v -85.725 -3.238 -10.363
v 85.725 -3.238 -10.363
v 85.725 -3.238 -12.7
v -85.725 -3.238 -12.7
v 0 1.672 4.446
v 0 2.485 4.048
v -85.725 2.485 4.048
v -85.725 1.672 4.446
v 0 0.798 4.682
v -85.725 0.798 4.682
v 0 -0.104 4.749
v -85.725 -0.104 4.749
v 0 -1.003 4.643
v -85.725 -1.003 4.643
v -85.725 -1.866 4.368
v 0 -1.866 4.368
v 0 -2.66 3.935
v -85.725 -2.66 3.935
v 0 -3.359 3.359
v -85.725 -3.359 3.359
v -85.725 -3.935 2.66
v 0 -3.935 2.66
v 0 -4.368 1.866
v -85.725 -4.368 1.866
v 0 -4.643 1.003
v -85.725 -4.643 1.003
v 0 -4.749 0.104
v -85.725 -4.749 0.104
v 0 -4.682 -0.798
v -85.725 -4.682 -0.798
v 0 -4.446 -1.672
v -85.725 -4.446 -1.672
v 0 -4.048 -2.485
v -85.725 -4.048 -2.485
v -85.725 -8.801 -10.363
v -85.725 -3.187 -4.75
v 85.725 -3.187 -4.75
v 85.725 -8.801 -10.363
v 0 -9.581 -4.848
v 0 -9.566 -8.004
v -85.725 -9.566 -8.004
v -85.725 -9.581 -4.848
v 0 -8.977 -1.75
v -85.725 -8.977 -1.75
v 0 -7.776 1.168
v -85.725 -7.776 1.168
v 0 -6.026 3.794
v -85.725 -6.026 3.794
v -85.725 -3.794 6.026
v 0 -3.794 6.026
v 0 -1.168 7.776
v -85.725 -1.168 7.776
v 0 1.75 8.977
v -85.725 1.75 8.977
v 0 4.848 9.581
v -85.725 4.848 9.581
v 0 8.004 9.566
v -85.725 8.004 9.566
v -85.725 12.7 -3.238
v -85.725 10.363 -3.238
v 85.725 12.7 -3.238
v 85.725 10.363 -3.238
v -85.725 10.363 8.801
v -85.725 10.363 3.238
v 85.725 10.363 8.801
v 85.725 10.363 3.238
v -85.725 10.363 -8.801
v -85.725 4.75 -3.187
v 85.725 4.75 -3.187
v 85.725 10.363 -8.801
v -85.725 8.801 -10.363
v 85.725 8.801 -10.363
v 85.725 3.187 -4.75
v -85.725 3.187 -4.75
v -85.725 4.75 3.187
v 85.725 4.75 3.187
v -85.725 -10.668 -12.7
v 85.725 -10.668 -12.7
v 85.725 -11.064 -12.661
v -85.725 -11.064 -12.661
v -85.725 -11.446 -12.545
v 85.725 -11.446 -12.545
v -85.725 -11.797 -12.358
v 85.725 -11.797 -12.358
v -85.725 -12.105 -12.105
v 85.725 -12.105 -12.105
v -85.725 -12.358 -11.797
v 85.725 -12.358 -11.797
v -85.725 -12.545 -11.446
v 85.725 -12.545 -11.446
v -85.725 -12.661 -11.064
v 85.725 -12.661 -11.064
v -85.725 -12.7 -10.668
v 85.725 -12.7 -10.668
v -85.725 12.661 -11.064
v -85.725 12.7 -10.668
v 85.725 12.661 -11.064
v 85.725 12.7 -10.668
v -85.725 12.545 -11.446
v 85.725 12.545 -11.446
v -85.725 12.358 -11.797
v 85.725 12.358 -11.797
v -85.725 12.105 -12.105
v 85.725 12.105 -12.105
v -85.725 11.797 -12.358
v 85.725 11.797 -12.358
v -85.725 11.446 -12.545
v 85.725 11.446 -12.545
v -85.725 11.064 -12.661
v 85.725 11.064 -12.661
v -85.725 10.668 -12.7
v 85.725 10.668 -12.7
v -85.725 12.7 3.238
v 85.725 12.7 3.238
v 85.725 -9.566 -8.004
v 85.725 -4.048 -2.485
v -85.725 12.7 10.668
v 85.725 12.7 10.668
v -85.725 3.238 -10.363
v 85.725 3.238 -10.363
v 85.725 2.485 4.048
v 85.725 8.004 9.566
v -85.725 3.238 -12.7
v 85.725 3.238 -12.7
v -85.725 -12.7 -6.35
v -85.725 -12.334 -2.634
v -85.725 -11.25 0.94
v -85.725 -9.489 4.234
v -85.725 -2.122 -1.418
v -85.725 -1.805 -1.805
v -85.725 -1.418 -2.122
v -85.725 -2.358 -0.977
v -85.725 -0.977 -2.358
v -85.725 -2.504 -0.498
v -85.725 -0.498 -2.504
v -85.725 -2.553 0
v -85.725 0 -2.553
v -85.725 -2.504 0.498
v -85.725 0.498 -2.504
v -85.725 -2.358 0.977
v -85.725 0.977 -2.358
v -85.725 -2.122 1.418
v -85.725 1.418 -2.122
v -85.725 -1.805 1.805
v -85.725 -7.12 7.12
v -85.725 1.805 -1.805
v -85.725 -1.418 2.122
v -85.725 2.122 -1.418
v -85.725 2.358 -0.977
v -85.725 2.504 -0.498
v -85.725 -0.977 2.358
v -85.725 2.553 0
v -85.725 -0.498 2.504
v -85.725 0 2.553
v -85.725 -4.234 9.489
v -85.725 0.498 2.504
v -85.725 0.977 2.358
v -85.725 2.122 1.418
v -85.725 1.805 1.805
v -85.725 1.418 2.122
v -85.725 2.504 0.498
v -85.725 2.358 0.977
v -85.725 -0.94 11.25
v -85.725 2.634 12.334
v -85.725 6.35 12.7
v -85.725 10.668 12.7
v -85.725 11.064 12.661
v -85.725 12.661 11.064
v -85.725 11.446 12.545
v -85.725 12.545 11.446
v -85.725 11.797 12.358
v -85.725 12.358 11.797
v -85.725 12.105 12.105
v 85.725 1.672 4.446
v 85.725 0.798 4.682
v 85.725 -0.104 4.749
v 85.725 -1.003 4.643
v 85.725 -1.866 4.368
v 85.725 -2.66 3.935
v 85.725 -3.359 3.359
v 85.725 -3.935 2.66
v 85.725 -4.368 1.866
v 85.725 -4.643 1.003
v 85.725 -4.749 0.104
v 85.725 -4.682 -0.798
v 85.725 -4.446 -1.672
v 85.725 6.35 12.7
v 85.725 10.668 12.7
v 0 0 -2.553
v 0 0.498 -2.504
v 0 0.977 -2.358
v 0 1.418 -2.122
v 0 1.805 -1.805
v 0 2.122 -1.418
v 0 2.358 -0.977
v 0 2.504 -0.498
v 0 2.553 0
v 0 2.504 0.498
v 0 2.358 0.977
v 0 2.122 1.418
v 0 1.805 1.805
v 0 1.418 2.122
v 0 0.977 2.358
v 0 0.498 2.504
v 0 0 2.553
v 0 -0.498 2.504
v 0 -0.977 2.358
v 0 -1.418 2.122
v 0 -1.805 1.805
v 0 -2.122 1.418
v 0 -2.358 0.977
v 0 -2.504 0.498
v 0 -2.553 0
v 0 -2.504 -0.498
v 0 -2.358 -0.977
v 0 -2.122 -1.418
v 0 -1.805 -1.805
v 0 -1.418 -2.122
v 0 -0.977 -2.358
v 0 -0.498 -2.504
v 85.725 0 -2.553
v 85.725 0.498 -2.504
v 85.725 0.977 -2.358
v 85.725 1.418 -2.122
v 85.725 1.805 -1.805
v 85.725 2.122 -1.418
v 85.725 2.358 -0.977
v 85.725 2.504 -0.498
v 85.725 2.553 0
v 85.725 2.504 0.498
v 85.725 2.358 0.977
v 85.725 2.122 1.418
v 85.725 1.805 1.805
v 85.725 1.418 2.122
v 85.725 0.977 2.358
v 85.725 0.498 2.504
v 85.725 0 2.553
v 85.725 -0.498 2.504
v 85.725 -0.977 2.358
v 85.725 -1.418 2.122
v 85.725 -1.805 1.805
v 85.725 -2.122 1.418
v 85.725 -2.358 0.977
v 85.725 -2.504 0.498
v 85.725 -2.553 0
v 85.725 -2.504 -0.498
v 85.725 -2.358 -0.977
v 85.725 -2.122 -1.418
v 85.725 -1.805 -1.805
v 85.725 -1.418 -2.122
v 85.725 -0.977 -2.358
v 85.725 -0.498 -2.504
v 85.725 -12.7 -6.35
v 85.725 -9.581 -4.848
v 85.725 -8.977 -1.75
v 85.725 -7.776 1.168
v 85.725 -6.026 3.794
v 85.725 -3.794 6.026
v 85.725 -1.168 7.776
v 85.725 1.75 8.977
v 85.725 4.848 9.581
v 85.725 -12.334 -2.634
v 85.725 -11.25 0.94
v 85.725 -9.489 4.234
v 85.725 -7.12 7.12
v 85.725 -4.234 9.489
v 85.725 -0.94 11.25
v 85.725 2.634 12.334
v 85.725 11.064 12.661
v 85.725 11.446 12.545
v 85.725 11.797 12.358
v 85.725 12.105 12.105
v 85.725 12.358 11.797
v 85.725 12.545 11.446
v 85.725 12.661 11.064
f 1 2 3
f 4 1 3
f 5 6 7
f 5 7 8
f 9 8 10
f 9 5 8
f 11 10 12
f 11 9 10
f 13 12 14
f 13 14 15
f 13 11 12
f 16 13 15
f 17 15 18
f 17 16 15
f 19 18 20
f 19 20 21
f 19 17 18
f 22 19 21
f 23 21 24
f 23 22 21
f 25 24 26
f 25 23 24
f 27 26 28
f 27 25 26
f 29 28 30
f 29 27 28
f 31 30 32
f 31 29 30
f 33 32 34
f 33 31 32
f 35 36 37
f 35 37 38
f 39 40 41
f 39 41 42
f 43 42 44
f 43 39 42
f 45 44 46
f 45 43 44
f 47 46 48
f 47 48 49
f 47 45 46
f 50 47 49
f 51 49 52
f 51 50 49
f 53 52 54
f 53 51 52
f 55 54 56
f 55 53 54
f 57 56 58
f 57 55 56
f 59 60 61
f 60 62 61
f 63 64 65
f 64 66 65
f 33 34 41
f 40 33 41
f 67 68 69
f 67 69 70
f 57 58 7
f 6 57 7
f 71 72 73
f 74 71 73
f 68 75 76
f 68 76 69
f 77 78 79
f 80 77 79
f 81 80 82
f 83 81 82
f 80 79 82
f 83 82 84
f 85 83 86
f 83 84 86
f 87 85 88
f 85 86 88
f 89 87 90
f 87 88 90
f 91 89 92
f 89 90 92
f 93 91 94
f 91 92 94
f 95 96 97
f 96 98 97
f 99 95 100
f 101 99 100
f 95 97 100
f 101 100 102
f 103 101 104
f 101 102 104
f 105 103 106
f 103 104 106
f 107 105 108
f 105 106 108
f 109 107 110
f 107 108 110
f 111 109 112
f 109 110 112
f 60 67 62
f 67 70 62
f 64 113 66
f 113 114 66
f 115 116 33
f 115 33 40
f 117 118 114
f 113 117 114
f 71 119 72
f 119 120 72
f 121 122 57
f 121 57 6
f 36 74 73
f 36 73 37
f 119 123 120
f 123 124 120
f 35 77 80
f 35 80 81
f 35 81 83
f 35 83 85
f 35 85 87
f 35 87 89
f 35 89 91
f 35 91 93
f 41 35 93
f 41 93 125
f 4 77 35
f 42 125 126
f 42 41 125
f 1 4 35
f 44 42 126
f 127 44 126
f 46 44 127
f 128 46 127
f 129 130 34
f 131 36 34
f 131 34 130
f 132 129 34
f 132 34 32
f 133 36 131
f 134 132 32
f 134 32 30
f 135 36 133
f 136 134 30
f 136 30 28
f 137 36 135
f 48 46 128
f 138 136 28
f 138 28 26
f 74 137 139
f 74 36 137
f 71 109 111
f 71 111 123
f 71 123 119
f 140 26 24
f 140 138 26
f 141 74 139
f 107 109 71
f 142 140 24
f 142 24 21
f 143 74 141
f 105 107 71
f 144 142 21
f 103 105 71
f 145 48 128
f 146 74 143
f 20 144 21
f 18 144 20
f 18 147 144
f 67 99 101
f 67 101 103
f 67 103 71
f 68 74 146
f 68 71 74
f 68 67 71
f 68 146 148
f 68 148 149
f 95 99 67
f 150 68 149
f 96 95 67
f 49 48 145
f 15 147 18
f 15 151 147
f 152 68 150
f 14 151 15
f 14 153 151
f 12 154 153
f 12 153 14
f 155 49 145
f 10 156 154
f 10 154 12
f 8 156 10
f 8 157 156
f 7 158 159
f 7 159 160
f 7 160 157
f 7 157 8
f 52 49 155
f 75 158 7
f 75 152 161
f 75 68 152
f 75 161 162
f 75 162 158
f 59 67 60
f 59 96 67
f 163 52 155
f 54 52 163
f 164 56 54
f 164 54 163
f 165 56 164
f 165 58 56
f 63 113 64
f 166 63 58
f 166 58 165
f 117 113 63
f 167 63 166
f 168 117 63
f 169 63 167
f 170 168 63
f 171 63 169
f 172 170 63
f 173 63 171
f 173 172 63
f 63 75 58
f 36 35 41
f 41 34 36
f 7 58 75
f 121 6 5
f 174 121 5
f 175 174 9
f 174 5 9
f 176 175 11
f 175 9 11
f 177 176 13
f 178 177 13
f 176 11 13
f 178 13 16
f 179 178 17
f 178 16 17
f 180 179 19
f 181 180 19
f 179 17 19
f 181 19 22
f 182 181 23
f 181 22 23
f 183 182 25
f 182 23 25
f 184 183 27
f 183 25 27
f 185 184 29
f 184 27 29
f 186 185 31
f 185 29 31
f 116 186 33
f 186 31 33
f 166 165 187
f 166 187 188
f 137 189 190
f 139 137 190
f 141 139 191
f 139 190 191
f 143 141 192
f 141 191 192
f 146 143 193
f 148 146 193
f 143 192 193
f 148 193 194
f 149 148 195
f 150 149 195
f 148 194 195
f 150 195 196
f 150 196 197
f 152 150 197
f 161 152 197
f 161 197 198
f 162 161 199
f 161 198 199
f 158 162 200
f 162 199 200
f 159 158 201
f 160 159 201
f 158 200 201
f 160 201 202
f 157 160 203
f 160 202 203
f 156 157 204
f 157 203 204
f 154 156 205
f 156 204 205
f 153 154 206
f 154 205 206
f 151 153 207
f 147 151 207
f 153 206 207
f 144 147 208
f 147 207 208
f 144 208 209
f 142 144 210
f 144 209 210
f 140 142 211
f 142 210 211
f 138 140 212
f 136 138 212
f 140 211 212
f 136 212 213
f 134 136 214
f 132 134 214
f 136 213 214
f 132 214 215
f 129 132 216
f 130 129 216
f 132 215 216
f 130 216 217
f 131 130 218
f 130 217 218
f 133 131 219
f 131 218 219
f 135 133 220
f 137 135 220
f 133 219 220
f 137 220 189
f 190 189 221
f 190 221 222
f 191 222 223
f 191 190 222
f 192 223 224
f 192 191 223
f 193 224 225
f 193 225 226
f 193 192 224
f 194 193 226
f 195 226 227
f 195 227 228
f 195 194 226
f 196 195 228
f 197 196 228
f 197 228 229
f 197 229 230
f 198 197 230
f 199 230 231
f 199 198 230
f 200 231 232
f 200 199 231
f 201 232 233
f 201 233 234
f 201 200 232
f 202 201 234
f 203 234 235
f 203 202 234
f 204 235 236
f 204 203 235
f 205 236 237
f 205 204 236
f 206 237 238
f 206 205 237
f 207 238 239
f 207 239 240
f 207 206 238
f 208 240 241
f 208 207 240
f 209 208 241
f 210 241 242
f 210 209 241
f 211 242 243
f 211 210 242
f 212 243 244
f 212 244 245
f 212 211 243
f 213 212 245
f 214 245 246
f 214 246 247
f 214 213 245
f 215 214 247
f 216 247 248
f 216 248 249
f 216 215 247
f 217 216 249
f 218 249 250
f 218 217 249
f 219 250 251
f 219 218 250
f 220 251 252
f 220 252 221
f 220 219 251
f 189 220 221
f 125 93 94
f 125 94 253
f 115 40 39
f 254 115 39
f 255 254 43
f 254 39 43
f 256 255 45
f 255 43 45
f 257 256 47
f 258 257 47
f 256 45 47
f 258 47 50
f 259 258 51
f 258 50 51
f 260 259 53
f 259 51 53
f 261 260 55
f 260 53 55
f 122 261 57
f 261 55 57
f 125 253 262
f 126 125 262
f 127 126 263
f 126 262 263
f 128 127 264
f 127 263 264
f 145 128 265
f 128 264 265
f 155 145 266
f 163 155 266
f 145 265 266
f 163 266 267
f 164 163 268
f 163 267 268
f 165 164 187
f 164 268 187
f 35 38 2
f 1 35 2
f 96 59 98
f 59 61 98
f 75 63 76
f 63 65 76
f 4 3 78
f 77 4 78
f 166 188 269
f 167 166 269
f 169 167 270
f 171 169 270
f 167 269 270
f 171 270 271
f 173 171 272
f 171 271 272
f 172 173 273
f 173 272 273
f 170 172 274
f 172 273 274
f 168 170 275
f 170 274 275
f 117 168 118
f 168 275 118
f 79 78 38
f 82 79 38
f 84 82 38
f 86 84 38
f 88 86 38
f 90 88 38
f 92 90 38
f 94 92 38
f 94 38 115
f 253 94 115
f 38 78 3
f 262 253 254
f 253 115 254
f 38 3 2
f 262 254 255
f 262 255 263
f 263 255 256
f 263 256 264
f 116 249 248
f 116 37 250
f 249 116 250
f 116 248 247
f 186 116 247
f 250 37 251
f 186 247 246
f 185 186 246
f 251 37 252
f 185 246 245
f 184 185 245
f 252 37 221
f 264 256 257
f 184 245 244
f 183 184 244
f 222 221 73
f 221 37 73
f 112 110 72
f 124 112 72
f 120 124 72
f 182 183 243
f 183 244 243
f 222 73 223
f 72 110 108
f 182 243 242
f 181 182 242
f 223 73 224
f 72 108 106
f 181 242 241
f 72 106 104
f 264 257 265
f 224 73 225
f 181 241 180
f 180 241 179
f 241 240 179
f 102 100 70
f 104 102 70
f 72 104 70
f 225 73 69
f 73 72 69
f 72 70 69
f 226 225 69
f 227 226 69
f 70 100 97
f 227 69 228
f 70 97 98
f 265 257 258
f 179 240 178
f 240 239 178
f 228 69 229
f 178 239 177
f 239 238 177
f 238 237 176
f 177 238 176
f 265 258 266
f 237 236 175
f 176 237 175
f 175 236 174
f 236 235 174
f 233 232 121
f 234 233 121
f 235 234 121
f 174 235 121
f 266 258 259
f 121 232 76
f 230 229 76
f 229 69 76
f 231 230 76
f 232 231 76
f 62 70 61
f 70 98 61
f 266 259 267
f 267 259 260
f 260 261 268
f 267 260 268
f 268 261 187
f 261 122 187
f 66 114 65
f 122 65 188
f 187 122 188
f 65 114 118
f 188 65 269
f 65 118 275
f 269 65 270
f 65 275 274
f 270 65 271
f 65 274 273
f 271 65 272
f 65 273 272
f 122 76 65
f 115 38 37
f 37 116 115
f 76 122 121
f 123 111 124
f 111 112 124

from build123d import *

# Parameters (mm, degrees)
SKETCH3_R                = 2.5527
BOSS_EXTRUDE1_DEPTH      = 85.725
BOSS_EXTRUDE1_DEPTH_BACK = 85.725


with BuildPart() as part:
    # Sketch3 → Boss-Extrude1 (new body, two sides)
    with BuildSketch(Plane(origin=(0, 0, 0), x_dir=(0, 0, -1), z_dir=(1, 0, 0))) as boss_extrude1_sk:
        with BuildLine():
            Line((-10.668, 12.7), (-3.2385, 12.7))
            Line((-3.2385, 12.7), (-3.2385, 10.3632))
            Line((-3.2385, 10.3632), (-8.800635435, 10.3632))
            Line((-8.800635435, 10.3632), (-3.187235669, 4.749800235))
            Line((-3.187235669, 4.749800235), (3.187235669, 4.749800235))
            Line((3.187235669, 4.749800235), (8.800635435, 10.3632))
            Line((8.800635435, 10.3632), (3.2385, 10.3632))
            Line((3.2385, 10.3632), (3.2385, 12.7))
            Line((3.2385, 12.7), (10.668, 12.7))
            ThreePointArc((10.668, 12.7), (12.104840979, 12.104840979), (12.7, 10.668))
            Line((12.7, 10.668), (12.7, 3.2385))
            Line((12.7, 3.2385), (10.3632, 3.2385))
            Line((10.3632, 3.2385), (10.3632, 8.800635435))
            Line((10.3632, 8.800635435), (4.749800235, 3.187235669))
            Line((4.749800235, 3.187235669), (4.749800235, -3.187235669))
            Line((4.749800235, -3.187235669), (10.3632, -8.800635435))
            Line((10.3632, -8.800635435), (10.3632, -3.2385))
            Line((10.3632, -3.2385), (12.7, -3.2385))
            Line((12.7, -3.2385), (12.7, -10.668))
            ThreePointArc((12.7, -10.668), (12.104840979, -12.104840979), (10.668, -12.7))
            Line((10.668, -12.7), (6.35, -12.7))
            ThreePointArc((6.35, -12.7), (-7.120384182, -7.120384182), (-12.7, 6.35))
            Line((-12.7, 6.35), (-12.7, 10.668))
            ThreePointArc((-12.7, 10.668), (-12.104840979, 12.104840979), (-10.668, 12.7))
        make_face()
        Circle(SKETCH3_R, mode=Mode.SUBTRACT)
        with BuildLine():
            Line((2.485198871, -4.047763436), (8.003751298, -9.566315863))
            ThreePointArc((8.003751298, -9.566315863), (-4.965122713, -4.965122713), (-9.566315863, 8.003751298))
            Line((-9.566315863, 8.003751298), (-4.047763436, 2.485198871))
            ThreePointArc((-4.047763436, 2.485198871), (-3.358615955, -3.358615955), (2.485198871, -4.047763436))
        make_face(mode=Mode.SUBTRACT)
    extrude(amount=BOSS_EXTRUDE1_DEPTH)
    extrude(boss_extrude1_sk.sketch, amount=-BOSS_EXTRUDE1_DEPTH_BACK)


solid = part.part
